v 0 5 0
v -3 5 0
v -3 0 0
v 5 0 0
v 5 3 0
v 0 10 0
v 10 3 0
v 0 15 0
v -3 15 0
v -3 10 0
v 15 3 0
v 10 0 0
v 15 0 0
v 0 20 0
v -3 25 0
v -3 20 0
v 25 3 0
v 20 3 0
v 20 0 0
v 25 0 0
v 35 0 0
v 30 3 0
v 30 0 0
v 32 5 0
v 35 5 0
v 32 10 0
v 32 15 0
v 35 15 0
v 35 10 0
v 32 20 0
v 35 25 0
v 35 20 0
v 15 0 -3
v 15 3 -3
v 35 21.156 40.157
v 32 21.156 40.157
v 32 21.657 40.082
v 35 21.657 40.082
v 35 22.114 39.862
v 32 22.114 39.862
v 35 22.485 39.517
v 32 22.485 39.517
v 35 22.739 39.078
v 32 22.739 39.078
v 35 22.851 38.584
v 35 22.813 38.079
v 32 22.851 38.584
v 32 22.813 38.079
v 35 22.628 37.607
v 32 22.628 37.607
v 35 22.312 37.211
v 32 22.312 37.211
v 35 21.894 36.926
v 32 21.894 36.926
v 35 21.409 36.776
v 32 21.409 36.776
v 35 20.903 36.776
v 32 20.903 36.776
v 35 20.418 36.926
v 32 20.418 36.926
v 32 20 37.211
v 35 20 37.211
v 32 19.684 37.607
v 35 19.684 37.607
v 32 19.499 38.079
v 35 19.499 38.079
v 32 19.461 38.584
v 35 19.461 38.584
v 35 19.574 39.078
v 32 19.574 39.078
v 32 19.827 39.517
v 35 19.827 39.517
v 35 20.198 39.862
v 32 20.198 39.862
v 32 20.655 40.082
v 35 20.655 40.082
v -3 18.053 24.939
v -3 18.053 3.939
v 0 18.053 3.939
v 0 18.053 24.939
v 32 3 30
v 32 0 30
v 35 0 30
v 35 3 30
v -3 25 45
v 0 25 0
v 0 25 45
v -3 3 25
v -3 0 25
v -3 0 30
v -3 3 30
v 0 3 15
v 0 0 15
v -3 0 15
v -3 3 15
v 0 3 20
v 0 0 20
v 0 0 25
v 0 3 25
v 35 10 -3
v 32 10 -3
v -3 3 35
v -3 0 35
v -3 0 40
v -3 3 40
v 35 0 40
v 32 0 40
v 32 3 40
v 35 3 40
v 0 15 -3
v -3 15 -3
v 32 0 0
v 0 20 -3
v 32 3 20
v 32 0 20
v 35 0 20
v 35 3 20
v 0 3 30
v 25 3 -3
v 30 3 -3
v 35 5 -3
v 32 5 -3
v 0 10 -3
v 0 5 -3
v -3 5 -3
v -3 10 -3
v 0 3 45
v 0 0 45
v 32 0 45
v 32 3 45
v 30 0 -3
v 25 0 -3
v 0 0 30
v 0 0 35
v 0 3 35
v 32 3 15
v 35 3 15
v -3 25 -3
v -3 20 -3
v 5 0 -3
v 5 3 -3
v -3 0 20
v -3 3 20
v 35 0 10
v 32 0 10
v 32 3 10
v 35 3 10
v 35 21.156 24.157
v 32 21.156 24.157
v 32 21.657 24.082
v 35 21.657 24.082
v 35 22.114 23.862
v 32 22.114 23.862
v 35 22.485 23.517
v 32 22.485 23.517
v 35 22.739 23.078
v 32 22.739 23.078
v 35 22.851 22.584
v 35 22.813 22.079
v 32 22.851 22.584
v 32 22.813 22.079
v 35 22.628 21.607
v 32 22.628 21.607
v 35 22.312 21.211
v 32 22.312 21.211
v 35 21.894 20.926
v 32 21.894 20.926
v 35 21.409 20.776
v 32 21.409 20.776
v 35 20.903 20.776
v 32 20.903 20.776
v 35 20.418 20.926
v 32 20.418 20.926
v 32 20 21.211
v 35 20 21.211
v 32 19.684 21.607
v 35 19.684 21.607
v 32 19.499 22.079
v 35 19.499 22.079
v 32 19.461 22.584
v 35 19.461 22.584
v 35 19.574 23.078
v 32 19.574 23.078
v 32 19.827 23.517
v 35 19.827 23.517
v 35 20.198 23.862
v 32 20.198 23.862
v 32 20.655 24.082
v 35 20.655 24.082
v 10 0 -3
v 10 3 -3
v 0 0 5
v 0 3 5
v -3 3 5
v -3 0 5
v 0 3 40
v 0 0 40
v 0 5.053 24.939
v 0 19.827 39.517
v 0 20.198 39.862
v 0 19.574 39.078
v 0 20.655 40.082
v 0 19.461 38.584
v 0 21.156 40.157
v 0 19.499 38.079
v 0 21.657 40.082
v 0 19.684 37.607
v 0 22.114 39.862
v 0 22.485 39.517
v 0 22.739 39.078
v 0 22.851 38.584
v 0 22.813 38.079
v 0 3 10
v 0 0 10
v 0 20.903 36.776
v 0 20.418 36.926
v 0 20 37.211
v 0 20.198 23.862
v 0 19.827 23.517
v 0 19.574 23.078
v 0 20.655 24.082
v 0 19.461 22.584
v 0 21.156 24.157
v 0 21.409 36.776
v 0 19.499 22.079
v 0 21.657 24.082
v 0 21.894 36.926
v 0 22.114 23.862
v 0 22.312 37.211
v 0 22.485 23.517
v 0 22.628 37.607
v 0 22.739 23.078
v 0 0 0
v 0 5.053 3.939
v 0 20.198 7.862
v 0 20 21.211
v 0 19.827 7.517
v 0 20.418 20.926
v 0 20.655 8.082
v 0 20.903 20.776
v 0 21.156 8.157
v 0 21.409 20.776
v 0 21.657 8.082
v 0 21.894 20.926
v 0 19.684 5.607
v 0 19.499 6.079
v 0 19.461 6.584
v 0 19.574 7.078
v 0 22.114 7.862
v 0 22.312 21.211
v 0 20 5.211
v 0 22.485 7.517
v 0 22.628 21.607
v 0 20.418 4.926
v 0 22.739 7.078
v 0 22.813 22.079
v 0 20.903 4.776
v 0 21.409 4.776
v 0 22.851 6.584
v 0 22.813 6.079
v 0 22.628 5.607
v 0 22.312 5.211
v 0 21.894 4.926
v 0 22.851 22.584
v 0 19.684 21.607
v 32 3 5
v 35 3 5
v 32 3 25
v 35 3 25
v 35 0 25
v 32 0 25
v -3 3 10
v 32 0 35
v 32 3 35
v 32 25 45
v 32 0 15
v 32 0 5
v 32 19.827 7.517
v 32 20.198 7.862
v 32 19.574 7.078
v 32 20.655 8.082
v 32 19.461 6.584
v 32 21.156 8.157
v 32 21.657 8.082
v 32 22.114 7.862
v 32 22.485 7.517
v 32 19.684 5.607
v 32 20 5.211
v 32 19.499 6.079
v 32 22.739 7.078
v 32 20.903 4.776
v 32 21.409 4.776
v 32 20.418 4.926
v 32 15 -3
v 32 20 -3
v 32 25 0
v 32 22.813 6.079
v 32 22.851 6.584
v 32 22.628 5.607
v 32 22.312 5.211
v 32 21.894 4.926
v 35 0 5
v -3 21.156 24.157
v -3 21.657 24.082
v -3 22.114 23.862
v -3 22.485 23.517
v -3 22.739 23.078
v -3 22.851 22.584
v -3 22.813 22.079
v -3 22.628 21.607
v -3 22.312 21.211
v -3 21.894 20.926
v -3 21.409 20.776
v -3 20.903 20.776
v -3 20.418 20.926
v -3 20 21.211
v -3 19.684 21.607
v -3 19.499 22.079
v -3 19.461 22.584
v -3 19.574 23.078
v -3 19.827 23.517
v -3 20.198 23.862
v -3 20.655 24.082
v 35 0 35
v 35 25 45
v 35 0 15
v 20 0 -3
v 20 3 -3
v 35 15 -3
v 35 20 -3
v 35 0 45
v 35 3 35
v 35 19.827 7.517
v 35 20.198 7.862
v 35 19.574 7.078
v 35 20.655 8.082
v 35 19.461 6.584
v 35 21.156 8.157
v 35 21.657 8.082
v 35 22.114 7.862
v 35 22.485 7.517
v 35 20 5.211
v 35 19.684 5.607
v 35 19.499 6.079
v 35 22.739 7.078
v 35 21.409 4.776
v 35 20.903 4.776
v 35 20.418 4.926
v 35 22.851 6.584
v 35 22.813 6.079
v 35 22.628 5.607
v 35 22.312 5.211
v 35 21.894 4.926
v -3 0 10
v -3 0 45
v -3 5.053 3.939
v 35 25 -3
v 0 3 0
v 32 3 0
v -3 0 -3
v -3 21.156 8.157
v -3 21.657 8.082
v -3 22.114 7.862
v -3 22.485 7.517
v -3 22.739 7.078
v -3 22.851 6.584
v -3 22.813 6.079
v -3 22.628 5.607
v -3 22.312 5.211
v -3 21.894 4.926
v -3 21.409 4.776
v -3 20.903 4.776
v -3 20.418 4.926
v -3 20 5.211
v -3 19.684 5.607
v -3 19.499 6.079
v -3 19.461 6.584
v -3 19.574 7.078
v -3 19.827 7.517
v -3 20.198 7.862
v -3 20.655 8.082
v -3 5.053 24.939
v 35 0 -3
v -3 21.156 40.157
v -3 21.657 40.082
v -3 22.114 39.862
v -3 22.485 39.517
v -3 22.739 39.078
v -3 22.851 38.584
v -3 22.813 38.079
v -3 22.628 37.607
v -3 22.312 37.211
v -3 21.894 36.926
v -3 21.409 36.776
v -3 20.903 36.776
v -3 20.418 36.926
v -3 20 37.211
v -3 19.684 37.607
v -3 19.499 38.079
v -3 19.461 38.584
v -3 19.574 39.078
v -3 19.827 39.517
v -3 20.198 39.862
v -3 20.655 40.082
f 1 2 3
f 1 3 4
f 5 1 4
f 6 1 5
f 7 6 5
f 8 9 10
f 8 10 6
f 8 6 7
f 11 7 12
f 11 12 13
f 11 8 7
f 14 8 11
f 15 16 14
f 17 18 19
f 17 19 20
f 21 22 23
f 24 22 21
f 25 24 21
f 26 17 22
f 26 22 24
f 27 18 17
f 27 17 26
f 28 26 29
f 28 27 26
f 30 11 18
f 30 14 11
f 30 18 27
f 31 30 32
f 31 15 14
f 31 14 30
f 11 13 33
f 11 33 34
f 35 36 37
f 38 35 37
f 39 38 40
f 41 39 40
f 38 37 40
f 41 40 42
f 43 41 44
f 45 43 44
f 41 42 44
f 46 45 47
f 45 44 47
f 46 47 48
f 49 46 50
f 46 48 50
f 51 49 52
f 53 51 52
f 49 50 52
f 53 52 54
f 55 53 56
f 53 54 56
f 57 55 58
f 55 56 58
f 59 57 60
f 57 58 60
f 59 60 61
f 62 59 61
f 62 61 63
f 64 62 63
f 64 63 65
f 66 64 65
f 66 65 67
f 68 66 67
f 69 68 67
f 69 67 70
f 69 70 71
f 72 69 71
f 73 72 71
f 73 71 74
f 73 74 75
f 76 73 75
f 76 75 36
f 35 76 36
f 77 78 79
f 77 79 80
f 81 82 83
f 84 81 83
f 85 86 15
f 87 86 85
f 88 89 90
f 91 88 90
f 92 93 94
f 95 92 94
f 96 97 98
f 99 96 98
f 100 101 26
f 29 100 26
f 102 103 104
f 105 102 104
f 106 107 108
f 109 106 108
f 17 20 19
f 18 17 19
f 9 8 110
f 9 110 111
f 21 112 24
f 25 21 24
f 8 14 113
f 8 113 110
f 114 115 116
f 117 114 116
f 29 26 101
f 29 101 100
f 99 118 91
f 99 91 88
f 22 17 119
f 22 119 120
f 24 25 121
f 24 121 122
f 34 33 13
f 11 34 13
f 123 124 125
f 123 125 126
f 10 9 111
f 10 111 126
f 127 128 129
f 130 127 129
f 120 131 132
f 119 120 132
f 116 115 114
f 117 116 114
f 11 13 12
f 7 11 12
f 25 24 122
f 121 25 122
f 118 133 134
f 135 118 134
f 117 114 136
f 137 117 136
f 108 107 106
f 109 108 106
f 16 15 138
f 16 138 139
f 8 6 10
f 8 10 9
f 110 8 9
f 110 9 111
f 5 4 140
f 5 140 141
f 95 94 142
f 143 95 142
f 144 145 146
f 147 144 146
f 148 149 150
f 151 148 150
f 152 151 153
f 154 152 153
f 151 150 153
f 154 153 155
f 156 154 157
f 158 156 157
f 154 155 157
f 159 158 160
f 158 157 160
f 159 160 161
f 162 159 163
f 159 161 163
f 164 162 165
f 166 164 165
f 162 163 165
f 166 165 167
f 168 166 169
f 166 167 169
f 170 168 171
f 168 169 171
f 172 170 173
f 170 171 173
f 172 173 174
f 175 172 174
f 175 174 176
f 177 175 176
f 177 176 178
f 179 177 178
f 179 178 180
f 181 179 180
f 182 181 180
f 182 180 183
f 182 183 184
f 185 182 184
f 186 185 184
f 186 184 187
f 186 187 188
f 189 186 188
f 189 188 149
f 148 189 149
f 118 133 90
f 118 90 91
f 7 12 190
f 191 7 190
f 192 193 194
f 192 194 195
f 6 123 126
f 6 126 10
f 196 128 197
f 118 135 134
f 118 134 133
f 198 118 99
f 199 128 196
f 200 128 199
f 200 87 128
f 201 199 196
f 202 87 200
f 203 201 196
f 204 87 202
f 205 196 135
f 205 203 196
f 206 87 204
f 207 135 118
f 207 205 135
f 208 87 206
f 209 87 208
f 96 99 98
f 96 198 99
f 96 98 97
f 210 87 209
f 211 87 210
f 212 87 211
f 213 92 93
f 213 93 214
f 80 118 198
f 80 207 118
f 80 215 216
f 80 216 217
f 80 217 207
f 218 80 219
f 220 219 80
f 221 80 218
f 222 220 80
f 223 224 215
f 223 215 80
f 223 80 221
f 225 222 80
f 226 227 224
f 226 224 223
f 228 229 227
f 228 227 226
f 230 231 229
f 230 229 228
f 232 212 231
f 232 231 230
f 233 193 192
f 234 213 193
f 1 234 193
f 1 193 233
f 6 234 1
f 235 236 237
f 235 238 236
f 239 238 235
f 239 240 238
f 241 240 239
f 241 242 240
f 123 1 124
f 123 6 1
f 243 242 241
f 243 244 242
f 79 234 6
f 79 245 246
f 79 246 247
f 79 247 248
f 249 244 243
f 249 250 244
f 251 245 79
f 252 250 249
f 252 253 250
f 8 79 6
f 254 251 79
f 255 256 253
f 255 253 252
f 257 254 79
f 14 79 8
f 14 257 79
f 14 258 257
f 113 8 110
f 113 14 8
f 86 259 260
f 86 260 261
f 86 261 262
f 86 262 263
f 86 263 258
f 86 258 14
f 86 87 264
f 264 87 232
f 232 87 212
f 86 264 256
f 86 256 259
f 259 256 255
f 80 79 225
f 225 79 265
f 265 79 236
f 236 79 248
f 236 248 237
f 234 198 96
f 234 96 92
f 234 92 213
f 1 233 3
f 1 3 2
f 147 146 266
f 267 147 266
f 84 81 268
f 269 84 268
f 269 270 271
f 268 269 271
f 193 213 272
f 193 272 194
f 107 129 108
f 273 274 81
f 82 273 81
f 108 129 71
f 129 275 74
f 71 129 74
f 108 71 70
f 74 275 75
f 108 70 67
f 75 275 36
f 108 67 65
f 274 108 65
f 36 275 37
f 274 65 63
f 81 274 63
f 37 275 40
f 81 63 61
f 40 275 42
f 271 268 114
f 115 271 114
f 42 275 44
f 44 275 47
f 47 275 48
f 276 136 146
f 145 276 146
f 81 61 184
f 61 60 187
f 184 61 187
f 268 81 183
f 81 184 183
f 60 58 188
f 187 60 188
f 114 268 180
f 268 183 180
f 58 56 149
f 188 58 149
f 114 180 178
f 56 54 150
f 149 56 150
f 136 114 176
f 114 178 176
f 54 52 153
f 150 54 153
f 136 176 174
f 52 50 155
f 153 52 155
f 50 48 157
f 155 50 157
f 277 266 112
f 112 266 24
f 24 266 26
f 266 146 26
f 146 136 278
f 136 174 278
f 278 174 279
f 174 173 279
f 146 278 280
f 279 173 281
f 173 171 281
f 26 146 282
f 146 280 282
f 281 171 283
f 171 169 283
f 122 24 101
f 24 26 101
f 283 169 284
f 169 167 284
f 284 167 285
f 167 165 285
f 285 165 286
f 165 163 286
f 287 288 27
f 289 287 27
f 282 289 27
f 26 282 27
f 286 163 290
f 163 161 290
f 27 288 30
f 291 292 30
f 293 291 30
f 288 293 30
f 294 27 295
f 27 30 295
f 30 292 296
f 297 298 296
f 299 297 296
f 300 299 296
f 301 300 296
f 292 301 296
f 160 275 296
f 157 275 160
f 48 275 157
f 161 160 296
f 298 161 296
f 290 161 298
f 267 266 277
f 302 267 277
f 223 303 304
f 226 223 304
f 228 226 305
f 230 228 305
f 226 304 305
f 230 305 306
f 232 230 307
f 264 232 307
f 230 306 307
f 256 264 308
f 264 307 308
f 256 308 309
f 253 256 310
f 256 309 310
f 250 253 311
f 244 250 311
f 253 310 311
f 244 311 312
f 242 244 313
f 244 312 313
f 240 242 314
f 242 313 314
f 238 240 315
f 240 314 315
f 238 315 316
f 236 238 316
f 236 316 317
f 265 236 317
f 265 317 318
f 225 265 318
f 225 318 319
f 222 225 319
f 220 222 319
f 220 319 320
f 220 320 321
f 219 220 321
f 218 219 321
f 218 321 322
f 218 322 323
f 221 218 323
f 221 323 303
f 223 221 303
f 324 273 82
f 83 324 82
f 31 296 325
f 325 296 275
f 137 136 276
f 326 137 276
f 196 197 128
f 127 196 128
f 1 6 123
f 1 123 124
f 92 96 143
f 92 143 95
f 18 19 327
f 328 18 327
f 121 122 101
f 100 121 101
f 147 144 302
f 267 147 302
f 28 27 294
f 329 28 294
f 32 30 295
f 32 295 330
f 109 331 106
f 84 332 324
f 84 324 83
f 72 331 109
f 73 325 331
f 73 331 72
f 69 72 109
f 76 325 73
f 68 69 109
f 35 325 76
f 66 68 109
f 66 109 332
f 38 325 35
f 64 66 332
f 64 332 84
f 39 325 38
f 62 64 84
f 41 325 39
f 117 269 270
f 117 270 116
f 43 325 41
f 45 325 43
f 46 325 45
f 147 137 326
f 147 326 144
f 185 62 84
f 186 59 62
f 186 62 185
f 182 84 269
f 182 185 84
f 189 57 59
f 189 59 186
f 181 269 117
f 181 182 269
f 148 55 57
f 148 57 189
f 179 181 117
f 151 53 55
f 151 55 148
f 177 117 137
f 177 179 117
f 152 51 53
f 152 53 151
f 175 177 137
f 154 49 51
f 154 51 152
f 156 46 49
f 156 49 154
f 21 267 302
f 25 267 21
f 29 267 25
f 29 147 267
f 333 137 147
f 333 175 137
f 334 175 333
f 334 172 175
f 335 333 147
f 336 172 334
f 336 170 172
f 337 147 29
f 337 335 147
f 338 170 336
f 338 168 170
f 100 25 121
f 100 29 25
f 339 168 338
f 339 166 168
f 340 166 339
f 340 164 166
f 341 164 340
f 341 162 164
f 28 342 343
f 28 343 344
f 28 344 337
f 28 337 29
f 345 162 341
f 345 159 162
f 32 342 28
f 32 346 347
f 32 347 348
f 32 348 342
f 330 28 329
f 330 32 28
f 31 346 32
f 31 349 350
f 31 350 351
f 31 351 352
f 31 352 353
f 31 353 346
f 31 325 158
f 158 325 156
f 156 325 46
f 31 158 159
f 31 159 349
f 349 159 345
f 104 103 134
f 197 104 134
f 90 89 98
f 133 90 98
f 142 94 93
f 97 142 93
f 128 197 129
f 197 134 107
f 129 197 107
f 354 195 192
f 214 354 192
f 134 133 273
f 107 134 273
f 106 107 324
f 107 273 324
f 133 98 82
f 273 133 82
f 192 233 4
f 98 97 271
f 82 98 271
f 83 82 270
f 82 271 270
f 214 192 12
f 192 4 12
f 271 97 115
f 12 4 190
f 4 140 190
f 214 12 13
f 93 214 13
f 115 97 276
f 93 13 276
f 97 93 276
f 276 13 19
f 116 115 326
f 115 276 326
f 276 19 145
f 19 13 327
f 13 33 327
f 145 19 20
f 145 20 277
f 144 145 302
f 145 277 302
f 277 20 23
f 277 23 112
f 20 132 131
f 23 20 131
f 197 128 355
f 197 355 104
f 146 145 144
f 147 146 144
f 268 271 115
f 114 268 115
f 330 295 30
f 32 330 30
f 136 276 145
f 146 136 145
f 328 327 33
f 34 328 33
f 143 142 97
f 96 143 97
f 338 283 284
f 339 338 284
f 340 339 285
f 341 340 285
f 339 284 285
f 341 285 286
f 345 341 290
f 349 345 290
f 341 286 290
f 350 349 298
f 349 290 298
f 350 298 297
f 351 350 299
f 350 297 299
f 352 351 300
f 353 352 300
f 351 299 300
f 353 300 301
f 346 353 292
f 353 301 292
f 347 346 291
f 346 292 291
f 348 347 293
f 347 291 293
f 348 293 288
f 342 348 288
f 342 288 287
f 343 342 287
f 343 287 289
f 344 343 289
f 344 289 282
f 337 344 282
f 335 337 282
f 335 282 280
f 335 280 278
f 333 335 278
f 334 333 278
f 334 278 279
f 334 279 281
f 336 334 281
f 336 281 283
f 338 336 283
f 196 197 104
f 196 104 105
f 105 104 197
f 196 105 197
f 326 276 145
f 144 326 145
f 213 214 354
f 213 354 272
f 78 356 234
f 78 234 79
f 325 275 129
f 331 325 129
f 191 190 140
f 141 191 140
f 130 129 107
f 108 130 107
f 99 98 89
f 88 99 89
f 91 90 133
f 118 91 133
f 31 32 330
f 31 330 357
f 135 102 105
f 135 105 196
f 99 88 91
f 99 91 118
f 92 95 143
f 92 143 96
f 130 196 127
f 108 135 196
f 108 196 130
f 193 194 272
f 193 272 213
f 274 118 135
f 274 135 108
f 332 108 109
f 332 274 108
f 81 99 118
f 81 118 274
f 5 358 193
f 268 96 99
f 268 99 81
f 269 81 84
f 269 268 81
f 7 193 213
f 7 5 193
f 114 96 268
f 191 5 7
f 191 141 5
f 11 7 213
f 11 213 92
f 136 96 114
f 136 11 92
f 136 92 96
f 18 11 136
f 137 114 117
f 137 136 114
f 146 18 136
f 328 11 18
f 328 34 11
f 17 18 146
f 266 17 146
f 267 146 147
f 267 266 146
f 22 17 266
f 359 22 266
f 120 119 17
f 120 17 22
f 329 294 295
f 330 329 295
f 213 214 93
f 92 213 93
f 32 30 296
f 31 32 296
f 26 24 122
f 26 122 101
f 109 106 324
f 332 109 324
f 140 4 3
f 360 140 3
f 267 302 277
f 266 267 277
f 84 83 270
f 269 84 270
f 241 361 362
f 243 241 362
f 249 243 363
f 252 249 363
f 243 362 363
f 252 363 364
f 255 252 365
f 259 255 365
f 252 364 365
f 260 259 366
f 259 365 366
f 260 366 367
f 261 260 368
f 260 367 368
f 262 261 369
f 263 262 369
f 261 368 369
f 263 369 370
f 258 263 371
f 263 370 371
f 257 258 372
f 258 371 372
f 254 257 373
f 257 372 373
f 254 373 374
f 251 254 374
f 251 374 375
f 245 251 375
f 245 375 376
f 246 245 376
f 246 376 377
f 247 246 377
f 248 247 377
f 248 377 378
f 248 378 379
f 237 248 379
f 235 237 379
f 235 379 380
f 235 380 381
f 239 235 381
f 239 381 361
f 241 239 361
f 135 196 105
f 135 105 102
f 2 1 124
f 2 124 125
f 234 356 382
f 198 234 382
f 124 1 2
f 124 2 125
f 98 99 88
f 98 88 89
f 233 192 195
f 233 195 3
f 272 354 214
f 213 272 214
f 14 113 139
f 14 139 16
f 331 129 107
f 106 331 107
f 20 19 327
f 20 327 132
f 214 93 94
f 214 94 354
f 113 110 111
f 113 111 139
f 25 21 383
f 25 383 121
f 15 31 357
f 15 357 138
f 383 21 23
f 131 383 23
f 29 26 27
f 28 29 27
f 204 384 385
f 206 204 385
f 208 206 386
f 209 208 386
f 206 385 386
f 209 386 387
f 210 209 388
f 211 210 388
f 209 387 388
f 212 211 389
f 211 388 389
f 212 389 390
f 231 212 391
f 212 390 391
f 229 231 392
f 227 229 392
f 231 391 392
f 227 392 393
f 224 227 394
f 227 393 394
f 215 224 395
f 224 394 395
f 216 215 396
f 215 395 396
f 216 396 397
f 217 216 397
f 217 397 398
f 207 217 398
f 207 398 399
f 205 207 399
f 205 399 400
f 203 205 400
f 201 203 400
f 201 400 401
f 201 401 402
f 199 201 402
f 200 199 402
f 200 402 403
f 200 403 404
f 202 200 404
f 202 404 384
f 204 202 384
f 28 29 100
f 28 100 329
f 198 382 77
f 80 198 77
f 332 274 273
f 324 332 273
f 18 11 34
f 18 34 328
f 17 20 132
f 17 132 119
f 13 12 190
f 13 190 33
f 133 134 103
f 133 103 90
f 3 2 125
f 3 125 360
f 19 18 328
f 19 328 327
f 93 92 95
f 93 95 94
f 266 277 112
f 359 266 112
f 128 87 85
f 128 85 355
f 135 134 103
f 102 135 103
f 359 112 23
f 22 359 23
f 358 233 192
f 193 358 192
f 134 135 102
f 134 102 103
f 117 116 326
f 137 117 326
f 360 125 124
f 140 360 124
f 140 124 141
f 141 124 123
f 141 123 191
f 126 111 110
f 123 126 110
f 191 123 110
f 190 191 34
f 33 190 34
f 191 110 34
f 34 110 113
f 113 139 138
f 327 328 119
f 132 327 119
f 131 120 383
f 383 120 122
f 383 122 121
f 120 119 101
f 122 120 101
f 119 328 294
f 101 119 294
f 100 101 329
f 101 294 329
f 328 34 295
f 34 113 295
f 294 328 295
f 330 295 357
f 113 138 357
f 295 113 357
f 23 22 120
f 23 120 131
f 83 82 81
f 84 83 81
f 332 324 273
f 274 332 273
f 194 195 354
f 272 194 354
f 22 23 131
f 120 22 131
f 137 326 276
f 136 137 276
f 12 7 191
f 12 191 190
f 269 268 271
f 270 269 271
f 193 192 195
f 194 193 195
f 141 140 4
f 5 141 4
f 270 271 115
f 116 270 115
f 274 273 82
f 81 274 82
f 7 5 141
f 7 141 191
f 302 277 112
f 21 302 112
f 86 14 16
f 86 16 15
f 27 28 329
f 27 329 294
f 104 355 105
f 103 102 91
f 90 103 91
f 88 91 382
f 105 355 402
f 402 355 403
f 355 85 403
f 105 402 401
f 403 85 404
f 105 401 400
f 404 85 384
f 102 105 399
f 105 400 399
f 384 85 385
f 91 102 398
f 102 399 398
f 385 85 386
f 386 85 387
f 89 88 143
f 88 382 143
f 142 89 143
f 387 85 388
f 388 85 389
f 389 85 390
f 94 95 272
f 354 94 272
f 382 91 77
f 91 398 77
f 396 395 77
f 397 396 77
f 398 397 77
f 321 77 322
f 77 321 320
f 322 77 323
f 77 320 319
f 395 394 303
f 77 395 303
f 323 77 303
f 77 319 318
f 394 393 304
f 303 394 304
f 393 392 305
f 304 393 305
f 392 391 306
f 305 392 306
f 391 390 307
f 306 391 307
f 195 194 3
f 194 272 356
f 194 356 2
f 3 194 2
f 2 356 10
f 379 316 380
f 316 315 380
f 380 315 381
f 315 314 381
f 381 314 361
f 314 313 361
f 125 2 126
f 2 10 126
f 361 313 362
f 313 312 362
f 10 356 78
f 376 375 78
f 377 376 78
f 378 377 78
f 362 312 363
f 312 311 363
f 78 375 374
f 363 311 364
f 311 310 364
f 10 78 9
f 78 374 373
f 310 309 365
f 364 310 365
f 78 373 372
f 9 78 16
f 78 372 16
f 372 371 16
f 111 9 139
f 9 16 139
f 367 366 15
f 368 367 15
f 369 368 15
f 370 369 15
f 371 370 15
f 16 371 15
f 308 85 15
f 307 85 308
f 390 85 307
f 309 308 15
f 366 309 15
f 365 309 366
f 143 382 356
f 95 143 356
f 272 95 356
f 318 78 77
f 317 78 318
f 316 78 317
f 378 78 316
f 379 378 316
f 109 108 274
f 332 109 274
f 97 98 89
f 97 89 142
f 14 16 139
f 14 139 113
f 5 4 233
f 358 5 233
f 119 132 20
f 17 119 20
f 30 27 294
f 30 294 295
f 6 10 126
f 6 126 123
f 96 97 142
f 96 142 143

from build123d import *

# Parameters (mm, degrees)
BOSS_EXTRUDE1_DEPTH = 3
BOSS_EXTRUDE2_DEPTH = 3
BOSS_EXTRUDE3_DEPTH = 3
SKETCH6_R           = 1.7
CUT_EXTRUDE1_DEPTH  = 44
SKETCH8_W           = 21
SKETCH8_H           = 13
CUT_EXTRUDE2_DEPTH  = 5


with BuildPart() as part:
    # Sketch1 → Boss-Extrude1 (new body)
    with BuildSketch(Plane(origin=(0, 0, 0), x_dir=(1, 0, 0), z_dir=(0, 1, 0))):
        Polygon((2, 0), (0, 0), (0, -5), (-3, -5), (-3, -10), (0, -10), (0, -15), (-3, -15), (-3, -20), (0, -20), (0, -25), (-3, -25), (-3, -30), (0, -30), (0, -35), (-3, -35), (-3, -40), (0, -40), (0, -45), (32, -45), (32, -40), (35, -40), (35, -35), (32, -35), (32, -30), (35, -30), (35, -25), (32, -25), (32, -20), (35, -20), (35, -15), (32, -15), (32, -10), (35, -10), (35, -5), (32, -5), (32, 0), (30, 0), (30, 3), (25, 3), (25, 0), (20, 0), (20, 3), (15, 3), (15, 0), (10, 0), (10, 3), (5, 3), (5, 0), align=None)
    extrude(amount=BOSS_EXTRUDE1_DEPTH)


with BuildPart() as body_2:
    # Sketch4 → Boss-Extrude2 (new body)
    with BuildSketch(Plane(origin=(32, 0, 0), x_dir=(0, 0, -1), z_dir=(1, 0, 0))):
        Polygon((-5, 3), (-5, 0), (0, 0), (0, 3), (0, 5), (3, 5), (3, 10), (0, 10), (0, 15), (3, 15), (3, 20), (0, 20), (0, 25), (-45, 25), (-45, 3), (-45, 0), (-40, 0), (-40, 3), (-35, 3), (-35, 0), (-30, 0), (-30, 3), (-25, 3), (-25, 0), (-20, 0), (-20, 3), (-15, 3), (-15, 0), (-10, 0), (-10, 3), align=None)
    extrude(amount=BOSS_EXTRUDE2_DEPTH)


with BuildPart() as body_3:
    # Mirror1: mirrored copy
    add(body_2.part.mirror(Plane.ZY.offset(-16)))


with BuildPart() as body_4:
    # Sketch5 → Boss-Extrude3 (new body)
    with BuildSketch(Plane(origin=(0, 0, 0), x_dir=(-1, 0, 0), z_dir=(0, 0, -1))):
        Polygon((-35, 25), (3, 25), (3, 20), (0, 20), (0, 15), (3, 15), (3, 10), (0, 10), (0, 5), (3, 5), (3, 0), (0, 0), (-5, 0), (-5, 3), (-10, 3), (-10, 0), (-15, 0), (-15, 3), (-20, 3), (-20, 0), (-25, 0), (-25, 3), (-30, 3), (-30, 0), (-32, 0), (-35, 0), (-35, 5), (-32, 5), (-32, 10), (-35, 10), (-35, 15), (-32, 15), (-32, 20), (-35, 20), align=None)
    extrude(amount=BOSS_EXTRUDE3_DEPTH)


with BuildPart() as cut_extrude1_tool:
    # Sketch6 → Cut-Extrude1 (new body)
    with BuildSketch(Plane.ZY.offset(3)):
        with Locations((6.457218302, 21.156015904)):
            Circle(SKETCH6_R)
        with Locations((22.457218302, 21.156015904)):
            Circle(SKETCH6_R)
        with Locations((38.457218302, 21.156015904)):
            Circle(SKETCH6_R)
    extrude(amount=-CUT_EXTRUDE1_DEPTH)


with BuildPart() as body_2_1:
    add(body_2.part)

    # Cut-Extrude1: cut by cut_extrude1_tool
    add(cut_extrude1_tool.part, mode=Mode.SUBTRACT)


with BuildPart() as body_3_1:
    add(body_3.part)

    # Cut-Extrude1: cut by cut_extrude1_tool
    add(cut_extrude1_tool.part, mode=Mode.SUBTRACT)

    # Sketch8 → Cut-Extrude2 (cut)
    with BuildSketch(Plane.ZY.offset(3)):
        with Locations((14.439060658, 11.55329355)):
            Rectangle(SKETCH8_W, SKETCH8_H)
    extrude(amount=-CUT_EXTRUDE2_DEPTH, mode=Mode.SUBTRACT)


solid = Compound([part.part, body_4.part, body_2_1.part, body_3_1.part])
